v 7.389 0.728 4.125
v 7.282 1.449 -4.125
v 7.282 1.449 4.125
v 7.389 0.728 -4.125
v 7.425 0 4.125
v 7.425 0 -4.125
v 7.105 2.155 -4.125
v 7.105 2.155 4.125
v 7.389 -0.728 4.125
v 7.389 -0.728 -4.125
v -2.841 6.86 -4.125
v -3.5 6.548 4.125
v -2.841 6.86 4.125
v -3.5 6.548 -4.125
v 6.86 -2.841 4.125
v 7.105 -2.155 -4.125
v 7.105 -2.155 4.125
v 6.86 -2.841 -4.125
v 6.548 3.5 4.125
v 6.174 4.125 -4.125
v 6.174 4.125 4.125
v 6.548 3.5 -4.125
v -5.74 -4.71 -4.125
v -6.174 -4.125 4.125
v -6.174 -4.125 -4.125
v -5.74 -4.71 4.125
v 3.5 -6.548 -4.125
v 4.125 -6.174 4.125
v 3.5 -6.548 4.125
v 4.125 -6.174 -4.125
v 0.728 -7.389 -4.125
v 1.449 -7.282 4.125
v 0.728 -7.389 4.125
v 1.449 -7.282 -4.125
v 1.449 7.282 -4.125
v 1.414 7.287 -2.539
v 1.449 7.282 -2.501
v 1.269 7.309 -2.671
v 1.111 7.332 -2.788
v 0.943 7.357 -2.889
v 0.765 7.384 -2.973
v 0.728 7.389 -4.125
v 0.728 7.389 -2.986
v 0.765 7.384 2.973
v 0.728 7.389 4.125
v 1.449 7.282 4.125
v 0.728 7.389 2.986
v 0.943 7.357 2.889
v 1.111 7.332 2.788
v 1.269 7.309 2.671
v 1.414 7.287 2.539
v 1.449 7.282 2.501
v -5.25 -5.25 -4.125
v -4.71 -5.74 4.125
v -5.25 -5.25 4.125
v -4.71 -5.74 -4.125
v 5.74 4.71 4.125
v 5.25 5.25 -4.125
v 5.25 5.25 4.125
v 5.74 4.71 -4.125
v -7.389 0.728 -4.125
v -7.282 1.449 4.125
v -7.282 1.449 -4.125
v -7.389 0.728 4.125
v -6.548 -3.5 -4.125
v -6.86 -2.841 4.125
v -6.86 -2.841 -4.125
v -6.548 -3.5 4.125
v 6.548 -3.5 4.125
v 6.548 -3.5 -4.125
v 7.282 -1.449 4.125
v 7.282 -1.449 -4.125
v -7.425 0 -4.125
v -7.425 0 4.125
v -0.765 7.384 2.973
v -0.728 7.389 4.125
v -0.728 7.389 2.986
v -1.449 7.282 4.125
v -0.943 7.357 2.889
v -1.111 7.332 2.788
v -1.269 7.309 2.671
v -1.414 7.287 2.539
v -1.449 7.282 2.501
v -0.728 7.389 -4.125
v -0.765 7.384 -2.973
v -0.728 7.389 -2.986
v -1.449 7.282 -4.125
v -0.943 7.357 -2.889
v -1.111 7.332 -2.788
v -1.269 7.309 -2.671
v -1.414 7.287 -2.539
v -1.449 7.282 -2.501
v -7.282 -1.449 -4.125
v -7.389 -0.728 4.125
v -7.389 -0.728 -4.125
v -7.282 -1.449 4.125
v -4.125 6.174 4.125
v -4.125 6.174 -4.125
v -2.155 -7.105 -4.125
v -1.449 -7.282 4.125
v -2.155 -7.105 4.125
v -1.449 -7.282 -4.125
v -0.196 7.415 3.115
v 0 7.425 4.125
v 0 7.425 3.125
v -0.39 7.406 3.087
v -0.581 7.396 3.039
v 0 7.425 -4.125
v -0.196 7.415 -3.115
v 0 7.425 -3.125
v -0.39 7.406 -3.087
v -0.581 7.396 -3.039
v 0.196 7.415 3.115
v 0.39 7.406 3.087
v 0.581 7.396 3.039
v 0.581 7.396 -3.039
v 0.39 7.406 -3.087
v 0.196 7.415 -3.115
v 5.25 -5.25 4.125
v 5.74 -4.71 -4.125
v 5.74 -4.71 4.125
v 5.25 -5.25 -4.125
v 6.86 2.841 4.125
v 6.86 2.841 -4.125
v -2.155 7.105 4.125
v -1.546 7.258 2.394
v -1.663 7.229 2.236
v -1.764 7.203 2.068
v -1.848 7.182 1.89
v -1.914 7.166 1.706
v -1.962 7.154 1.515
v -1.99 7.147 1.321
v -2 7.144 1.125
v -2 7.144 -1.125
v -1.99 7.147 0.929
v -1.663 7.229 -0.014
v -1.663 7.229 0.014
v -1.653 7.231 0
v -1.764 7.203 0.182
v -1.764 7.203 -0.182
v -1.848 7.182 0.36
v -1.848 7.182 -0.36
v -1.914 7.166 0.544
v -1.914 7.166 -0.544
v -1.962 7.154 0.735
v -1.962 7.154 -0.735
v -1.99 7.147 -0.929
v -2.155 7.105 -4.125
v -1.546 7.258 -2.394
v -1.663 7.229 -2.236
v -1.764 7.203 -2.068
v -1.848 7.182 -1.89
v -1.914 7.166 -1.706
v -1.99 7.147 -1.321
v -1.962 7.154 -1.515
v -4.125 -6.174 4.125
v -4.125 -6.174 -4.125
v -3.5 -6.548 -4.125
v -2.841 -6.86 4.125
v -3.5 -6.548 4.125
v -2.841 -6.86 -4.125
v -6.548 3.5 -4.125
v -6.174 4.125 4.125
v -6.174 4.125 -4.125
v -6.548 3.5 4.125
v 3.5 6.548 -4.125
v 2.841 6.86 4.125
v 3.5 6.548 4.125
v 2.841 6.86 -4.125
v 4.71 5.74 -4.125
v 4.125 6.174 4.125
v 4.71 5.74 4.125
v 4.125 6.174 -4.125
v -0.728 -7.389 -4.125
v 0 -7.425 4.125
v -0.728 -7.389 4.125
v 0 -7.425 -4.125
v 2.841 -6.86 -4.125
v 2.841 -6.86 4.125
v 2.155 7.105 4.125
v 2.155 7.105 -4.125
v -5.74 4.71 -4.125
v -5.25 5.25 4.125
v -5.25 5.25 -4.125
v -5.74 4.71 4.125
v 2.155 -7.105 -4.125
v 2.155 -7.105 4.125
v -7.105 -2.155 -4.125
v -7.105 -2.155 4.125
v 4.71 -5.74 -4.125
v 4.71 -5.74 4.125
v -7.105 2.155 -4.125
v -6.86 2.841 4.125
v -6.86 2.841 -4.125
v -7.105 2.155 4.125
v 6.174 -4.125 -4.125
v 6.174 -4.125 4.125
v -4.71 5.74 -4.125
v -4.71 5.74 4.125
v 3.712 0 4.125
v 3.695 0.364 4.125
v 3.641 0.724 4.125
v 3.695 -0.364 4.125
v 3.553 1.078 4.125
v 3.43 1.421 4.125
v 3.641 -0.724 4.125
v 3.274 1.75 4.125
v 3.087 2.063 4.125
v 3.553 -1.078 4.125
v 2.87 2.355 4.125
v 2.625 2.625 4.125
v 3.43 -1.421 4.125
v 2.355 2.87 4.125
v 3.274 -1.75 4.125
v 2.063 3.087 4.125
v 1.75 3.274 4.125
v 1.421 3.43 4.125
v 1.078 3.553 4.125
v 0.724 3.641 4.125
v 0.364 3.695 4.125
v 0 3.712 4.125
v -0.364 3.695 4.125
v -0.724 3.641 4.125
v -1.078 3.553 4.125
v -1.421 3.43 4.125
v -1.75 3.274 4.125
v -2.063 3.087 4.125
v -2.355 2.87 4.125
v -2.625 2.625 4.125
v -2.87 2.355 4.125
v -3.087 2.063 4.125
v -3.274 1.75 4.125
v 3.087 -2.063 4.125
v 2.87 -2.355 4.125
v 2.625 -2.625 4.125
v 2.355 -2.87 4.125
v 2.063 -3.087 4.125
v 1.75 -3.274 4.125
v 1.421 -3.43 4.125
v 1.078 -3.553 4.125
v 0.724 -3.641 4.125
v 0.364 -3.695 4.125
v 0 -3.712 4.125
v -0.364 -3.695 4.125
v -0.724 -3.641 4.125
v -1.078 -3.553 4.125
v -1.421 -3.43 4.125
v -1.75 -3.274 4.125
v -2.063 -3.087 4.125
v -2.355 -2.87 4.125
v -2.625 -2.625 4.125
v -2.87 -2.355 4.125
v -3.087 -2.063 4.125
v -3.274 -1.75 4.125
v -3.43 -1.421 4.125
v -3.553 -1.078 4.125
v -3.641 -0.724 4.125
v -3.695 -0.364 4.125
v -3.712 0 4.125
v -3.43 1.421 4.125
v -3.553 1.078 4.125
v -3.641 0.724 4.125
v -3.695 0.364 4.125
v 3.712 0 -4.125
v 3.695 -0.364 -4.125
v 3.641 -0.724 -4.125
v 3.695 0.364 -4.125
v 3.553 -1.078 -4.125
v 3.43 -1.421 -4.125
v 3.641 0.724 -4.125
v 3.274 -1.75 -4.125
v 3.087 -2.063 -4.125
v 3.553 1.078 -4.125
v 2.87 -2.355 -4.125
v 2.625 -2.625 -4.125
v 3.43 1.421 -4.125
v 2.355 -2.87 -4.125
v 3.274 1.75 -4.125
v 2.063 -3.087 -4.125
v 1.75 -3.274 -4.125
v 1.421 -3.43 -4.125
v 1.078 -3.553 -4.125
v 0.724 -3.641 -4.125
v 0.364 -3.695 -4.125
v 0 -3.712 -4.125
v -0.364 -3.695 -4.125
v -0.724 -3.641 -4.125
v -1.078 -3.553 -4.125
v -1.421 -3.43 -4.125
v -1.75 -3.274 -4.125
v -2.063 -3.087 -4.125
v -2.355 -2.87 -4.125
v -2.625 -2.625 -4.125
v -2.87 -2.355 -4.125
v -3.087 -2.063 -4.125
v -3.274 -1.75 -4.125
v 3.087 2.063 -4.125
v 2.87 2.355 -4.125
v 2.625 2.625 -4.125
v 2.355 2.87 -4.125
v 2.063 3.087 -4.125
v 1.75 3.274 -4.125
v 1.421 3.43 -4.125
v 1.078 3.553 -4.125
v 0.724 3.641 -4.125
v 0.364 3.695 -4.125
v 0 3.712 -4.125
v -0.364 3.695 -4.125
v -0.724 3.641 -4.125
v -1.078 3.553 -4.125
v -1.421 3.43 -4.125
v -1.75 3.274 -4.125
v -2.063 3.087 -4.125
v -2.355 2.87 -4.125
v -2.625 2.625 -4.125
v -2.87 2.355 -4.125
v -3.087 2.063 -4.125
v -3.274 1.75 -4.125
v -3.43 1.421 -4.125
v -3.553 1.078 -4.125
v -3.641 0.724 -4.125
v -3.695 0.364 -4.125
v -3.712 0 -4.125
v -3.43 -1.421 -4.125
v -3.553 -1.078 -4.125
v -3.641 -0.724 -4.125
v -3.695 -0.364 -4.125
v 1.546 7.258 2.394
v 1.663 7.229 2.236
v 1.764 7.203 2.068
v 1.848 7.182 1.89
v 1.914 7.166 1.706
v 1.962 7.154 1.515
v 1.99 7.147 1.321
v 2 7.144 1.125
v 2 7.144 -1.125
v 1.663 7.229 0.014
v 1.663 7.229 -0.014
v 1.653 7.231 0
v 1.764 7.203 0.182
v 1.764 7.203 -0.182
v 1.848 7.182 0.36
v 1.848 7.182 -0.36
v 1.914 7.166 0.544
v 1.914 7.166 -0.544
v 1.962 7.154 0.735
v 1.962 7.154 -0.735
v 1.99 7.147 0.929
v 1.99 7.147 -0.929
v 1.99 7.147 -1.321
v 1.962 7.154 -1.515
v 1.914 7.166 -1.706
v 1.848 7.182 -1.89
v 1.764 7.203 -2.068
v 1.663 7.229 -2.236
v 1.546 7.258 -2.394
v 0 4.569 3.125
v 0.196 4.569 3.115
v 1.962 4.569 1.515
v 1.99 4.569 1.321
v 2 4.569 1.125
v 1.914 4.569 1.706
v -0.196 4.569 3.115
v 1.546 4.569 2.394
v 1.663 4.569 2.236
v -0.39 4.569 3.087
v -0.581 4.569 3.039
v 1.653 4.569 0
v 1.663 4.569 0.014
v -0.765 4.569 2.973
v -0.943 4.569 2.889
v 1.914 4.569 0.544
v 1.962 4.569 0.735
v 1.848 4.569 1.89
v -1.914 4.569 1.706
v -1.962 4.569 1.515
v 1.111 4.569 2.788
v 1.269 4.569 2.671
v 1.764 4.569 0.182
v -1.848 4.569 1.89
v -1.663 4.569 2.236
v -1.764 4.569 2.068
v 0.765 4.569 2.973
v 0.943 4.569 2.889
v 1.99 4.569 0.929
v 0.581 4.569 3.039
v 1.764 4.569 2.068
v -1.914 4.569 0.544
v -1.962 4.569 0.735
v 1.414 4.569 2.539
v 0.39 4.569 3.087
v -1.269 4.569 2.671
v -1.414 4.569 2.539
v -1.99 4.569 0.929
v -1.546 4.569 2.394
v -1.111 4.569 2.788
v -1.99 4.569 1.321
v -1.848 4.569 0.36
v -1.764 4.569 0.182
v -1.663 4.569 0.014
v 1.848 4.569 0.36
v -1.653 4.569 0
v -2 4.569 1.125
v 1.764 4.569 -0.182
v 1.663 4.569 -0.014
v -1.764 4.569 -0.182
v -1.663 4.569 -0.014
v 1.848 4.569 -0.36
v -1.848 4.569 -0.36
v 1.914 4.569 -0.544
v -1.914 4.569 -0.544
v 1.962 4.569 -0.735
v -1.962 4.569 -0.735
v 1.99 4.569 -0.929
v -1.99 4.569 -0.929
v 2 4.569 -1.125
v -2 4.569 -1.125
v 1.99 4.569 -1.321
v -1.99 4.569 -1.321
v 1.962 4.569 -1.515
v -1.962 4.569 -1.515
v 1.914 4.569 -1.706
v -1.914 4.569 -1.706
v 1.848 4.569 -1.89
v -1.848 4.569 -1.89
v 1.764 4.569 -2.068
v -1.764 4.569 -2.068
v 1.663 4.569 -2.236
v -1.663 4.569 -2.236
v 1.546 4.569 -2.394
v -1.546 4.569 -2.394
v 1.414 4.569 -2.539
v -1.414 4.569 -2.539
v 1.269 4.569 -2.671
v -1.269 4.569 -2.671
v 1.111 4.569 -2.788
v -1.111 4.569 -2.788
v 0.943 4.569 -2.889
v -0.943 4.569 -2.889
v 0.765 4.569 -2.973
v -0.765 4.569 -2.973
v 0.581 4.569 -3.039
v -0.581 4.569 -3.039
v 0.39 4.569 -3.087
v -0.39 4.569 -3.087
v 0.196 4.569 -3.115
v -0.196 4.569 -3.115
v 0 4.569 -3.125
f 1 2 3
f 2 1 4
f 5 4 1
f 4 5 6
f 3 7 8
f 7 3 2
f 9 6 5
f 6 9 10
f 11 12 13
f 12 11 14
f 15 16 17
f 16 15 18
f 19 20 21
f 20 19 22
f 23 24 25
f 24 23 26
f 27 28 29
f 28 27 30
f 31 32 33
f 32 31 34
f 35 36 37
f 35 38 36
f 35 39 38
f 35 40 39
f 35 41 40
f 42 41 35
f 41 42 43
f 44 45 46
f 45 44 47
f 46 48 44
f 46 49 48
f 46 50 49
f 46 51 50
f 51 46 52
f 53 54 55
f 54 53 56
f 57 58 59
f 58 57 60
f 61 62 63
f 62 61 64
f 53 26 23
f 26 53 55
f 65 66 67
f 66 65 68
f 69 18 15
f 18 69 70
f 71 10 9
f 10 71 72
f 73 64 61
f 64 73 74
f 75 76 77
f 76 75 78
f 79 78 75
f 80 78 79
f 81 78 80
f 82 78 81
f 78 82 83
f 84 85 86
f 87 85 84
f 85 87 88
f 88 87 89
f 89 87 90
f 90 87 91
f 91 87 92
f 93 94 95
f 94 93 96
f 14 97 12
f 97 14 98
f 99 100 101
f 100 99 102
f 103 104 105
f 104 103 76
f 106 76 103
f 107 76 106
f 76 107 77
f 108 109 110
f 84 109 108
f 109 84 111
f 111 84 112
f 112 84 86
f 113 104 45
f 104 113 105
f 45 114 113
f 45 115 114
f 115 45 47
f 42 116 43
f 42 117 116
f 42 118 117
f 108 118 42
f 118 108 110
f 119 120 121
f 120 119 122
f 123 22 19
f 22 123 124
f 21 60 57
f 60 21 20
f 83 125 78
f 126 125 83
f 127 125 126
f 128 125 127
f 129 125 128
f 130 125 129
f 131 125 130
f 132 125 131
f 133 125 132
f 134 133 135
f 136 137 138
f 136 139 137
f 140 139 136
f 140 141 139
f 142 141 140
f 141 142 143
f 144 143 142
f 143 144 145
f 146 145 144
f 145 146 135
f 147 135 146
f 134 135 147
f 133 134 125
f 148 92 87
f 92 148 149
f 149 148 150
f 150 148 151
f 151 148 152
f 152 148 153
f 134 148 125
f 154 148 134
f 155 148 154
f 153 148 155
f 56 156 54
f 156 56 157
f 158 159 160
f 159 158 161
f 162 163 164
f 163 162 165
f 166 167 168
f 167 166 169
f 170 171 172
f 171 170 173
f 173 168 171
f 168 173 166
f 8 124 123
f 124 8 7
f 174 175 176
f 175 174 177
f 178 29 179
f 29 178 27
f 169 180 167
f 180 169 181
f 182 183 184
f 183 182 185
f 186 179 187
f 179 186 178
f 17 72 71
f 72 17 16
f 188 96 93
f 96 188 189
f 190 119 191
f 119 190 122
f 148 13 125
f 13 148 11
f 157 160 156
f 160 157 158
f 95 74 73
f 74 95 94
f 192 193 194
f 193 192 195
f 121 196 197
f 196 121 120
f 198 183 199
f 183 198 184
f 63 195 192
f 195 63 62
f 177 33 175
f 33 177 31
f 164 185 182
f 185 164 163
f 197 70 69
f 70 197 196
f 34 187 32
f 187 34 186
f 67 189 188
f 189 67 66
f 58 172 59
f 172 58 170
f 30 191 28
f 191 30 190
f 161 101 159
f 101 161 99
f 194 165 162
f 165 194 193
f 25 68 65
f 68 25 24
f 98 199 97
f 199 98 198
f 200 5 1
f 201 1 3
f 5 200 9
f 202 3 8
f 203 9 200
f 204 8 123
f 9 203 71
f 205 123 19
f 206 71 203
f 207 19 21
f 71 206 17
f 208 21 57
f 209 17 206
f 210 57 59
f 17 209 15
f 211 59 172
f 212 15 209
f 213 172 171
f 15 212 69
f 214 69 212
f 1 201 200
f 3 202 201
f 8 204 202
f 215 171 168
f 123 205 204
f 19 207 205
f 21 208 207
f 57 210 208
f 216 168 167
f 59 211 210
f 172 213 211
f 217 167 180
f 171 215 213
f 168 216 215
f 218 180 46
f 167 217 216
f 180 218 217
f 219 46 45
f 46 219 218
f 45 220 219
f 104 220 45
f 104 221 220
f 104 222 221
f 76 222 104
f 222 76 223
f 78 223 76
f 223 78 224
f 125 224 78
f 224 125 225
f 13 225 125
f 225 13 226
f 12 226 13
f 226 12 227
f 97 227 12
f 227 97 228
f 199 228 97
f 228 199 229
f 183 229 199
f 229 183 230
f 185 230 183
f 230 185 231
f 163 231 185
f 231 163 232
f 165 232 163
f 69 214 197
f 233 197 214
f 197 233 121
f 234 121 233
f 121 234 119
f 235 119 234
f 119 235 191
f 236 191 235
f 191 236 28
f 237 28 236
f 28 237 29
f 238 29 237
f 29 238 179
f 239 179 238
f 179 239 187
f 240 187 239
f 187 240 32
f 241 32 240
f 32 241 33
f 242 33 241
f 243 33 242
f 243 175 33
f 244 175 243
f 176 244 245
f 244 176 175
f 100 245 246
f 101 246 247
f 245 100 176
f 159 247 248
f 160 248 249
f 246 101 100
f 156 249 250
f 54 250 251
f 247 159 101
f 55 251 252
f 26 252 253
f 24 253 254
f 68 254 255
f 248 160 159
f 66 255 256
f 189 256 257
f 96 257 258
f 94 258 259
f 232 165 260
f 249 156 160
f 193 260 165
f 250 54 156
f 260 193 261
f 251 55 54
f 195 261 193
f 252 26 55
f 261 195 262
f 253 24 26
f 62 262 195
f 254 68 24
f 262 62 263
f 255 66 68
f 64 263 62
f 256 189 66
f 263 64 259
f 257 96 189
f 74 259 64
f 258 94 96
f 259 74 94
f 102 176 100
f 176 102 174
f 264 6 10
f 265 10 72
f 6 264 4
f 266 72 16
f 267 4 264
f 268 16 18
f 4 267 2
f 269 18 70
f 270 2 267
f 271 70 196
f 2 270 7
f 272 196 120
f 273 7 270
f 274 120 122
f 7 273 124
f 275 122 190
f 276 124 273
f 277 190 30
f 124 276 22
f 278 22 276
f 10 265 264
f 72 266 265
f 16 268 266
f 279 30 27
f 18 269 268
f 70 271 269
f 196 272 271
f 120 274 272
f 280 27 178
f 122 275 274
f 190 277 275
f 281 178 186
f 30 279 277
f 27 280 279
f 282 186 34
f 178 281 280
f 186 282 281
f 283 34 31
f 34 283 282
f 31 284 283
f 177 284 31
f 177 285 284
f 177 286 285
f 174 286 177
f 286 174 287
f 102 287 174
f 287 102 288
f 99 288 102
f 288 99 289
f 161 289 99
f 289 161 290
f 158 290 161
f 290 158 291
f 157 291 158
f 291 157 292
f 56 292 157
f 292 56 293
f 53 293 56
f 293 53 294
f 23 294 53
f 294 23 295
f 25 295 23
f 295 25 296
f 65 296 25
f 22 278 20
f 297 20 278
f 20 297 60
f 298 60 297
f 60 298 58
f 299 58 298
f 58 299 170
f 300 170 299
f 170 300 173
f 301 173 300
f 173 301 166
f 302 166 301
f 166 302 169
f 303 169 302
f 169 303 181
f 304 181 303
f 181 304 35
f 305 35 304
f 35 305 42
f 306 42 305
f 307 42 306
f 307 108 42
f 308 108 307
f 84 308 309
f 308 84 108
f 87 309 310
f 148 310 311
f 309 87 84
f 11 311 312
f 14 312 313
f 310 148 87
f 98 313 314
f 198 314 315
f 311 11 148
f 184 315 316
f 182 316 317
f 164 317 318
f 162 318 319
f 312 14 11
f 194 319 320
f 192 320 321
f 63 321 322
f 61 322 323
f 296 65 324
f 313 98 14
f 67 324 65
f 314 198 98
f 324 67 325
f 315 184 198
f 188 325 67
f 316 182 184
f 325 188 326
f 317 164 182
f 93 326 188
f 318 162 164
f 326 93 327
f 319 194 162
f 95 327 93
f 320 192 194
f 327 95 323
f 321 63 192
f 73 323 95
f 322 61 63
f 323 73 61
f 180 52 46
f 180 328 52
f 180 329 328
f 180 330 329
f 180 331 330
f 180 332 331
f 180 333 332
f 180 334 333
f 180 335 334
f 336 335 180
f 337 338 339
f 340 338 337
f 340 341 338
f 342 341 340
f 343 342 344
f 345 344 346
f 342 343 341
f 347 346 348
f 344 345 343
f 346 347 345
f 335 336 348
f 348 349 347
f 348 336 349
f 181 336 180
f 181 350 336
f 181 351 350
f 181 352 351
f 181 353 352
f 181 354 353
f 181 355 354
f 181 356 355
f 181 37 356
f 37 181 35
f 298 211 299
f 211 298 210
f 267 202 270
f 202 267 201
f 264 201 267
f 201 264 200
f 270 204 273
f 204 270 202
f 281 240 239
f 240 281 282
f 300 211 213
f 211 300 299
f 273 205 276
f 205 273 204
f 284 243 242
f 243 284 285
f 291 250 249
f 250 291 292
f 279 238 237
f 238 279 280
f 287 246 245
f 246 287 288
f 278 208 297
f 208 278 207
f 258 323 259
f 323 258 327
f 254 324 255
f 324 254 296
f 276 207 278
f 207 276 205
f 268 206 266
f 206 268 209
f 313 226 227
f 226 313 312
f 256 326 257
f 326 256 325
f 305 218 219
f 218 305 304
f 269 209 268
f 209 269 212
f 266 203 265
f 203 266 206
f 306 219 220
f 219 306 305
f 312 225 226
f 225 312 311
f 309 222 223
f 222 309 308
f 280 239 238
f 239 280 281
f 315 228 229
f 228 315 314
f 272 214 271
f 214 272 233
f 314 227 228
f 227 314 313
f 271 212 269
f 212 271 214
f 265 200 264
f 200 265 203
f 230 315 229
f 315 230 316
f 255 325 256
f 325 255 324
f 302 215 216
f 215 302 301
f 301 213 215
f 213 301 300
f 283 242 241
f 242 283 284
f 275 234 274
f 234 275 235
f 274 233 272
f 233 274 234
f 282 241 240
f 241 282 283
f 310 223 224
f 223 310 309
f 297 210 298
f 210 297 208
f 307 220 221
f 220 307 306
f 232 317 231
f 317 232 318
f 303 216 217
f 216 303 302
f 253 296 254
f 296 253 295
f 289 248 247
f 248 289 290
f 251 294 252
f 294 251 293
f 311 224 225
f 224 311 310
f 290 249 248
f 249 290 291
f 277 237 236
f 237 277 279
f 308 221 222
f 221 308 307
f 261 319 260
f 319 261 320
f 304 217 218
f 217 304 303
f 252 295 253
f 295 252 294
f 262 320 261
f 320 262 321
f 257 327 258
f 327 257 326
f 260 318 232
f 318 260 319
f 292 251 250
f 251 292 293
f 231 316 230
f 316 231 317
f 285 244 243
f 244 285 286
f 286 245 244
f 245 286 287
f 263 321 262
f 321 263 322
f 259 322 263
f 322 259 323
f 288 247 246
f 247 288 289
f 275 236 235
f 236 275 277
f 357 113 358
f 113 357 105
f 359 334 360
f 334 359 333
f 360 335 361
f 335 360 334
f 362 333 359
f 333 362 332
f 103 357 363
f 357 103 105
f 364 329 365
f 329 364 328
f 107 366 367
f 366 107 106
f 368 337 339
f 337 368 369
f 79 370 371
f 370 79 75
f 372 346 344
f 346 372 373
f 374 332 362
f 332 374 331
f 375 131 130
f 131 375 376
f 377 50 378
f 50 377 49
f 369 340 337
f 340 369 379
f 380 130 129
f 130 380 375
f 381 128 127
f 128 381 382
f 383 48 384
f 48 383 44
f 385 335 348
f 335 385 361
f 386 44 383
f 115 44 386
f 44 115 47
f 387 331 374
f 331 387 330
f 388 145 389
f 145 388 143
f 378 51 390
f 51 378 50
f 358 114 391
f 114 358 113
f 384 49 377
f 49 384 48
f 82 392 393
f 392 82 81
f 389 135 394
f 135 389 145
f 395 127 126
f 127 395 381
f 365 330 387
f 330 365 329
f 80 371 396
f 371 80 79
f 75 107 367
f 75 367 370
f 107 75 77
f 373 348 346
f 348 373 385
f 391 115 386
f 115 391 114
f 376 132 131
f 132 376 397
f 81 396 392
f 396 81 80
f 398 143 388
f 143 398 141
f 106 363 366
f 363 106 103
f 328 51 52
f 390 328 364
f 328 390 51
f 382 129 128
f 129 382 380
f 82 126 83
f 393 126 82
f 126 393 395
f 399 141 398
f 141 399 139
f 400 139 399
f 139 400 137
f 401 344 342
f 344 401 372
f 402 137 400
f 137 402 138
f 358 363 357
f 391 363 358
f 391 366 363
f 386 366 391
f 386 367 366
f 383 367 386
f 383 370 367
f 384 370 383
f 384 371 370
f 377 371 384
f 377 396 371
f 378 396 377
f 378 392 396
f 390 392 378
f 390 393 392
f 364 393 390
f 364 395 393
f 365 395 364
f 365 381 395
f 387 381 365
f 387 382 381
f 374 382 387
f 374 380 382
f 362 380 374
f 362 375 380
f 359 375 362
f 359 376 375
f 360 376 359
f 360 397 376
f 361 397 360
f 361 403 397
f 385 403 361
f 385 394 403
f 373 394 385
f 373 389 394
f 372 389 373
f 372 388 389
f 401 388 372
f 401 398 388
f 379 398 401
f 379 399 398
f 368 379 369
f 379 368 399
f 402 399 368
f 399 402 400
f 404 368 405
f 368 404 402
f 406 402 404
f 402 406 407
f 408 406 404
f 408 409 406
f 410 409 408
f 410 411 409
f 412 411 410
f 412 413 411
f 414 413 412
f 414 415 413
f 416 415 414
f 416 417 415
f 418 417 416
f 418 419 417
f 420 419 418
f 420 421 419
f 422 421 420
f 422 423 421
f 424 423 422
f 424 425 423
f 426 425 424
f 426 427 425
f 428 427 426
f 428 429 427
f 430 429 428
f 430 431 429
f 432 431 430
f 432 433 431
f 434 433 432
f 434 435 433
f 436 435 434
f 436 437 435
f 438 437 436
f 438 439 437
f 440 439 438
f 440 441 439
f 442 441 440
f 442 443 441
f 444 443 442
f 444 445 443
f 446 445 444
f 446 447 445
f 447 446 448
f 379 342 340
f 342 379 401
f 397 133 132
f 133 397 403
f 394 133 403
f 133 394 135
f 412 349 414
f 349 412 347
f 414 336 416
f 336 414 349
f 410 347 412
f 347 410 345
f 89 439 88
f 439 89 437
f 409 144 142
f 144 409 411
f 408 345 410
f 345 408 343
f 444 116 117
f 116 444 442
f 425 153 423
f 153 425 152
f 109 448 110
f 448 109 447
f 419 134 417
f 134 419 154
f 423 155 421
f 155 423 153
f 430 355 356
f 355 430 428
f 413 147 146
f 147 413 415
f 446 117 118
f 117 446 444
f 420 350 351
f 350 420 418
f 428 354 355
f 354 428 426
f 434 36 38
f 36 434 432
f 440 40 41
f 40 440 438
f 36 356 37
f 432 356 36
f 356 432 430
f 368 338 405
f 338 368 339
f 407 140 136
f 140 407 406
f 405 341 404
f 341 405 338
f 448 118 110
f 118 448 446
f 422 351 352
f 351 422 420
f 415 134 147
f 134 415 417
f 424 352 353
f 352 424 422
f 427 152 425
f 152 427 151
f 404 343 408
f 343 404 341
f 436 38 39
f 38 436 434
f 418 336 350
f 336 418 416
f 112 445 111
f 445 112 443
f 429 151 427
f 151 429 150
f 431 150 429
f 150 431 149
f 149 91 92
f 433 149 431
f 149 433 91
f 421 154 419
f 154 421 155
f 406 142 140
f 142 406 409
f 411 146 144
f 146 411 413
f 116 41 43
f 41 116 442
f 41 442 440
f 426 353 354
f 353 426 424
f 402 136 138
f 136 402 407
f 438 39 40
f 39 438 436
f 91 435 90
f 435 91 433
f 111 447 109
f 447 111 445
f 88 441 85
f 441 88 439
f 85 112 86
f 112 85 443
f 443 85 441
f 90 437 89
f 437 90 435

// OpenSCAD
// COBRA Vertebra - L4 V22
// Height: 8.25mm, OD: 14.850000000000001mm

$fn = 64;

difference() {
    // Outer cylinder
    cylinder(h=8.25, d=14.850000000000001, center=true);
    
    // Inner channel
    cylinder(h=10.25, d=7.425000000000001, center=true);

    // Pivot holes
    translate([0, 7.425000000000001, 1.125])
    rotate([90, 0, 0])
    cylinder(h=5.7125, d=4, center=true);
    
    translate([0, 7.425000000000001, -1.125])
    rotate([90, 0, 0])
    cylinder(h=5.7125, d=4, center=true);
}
